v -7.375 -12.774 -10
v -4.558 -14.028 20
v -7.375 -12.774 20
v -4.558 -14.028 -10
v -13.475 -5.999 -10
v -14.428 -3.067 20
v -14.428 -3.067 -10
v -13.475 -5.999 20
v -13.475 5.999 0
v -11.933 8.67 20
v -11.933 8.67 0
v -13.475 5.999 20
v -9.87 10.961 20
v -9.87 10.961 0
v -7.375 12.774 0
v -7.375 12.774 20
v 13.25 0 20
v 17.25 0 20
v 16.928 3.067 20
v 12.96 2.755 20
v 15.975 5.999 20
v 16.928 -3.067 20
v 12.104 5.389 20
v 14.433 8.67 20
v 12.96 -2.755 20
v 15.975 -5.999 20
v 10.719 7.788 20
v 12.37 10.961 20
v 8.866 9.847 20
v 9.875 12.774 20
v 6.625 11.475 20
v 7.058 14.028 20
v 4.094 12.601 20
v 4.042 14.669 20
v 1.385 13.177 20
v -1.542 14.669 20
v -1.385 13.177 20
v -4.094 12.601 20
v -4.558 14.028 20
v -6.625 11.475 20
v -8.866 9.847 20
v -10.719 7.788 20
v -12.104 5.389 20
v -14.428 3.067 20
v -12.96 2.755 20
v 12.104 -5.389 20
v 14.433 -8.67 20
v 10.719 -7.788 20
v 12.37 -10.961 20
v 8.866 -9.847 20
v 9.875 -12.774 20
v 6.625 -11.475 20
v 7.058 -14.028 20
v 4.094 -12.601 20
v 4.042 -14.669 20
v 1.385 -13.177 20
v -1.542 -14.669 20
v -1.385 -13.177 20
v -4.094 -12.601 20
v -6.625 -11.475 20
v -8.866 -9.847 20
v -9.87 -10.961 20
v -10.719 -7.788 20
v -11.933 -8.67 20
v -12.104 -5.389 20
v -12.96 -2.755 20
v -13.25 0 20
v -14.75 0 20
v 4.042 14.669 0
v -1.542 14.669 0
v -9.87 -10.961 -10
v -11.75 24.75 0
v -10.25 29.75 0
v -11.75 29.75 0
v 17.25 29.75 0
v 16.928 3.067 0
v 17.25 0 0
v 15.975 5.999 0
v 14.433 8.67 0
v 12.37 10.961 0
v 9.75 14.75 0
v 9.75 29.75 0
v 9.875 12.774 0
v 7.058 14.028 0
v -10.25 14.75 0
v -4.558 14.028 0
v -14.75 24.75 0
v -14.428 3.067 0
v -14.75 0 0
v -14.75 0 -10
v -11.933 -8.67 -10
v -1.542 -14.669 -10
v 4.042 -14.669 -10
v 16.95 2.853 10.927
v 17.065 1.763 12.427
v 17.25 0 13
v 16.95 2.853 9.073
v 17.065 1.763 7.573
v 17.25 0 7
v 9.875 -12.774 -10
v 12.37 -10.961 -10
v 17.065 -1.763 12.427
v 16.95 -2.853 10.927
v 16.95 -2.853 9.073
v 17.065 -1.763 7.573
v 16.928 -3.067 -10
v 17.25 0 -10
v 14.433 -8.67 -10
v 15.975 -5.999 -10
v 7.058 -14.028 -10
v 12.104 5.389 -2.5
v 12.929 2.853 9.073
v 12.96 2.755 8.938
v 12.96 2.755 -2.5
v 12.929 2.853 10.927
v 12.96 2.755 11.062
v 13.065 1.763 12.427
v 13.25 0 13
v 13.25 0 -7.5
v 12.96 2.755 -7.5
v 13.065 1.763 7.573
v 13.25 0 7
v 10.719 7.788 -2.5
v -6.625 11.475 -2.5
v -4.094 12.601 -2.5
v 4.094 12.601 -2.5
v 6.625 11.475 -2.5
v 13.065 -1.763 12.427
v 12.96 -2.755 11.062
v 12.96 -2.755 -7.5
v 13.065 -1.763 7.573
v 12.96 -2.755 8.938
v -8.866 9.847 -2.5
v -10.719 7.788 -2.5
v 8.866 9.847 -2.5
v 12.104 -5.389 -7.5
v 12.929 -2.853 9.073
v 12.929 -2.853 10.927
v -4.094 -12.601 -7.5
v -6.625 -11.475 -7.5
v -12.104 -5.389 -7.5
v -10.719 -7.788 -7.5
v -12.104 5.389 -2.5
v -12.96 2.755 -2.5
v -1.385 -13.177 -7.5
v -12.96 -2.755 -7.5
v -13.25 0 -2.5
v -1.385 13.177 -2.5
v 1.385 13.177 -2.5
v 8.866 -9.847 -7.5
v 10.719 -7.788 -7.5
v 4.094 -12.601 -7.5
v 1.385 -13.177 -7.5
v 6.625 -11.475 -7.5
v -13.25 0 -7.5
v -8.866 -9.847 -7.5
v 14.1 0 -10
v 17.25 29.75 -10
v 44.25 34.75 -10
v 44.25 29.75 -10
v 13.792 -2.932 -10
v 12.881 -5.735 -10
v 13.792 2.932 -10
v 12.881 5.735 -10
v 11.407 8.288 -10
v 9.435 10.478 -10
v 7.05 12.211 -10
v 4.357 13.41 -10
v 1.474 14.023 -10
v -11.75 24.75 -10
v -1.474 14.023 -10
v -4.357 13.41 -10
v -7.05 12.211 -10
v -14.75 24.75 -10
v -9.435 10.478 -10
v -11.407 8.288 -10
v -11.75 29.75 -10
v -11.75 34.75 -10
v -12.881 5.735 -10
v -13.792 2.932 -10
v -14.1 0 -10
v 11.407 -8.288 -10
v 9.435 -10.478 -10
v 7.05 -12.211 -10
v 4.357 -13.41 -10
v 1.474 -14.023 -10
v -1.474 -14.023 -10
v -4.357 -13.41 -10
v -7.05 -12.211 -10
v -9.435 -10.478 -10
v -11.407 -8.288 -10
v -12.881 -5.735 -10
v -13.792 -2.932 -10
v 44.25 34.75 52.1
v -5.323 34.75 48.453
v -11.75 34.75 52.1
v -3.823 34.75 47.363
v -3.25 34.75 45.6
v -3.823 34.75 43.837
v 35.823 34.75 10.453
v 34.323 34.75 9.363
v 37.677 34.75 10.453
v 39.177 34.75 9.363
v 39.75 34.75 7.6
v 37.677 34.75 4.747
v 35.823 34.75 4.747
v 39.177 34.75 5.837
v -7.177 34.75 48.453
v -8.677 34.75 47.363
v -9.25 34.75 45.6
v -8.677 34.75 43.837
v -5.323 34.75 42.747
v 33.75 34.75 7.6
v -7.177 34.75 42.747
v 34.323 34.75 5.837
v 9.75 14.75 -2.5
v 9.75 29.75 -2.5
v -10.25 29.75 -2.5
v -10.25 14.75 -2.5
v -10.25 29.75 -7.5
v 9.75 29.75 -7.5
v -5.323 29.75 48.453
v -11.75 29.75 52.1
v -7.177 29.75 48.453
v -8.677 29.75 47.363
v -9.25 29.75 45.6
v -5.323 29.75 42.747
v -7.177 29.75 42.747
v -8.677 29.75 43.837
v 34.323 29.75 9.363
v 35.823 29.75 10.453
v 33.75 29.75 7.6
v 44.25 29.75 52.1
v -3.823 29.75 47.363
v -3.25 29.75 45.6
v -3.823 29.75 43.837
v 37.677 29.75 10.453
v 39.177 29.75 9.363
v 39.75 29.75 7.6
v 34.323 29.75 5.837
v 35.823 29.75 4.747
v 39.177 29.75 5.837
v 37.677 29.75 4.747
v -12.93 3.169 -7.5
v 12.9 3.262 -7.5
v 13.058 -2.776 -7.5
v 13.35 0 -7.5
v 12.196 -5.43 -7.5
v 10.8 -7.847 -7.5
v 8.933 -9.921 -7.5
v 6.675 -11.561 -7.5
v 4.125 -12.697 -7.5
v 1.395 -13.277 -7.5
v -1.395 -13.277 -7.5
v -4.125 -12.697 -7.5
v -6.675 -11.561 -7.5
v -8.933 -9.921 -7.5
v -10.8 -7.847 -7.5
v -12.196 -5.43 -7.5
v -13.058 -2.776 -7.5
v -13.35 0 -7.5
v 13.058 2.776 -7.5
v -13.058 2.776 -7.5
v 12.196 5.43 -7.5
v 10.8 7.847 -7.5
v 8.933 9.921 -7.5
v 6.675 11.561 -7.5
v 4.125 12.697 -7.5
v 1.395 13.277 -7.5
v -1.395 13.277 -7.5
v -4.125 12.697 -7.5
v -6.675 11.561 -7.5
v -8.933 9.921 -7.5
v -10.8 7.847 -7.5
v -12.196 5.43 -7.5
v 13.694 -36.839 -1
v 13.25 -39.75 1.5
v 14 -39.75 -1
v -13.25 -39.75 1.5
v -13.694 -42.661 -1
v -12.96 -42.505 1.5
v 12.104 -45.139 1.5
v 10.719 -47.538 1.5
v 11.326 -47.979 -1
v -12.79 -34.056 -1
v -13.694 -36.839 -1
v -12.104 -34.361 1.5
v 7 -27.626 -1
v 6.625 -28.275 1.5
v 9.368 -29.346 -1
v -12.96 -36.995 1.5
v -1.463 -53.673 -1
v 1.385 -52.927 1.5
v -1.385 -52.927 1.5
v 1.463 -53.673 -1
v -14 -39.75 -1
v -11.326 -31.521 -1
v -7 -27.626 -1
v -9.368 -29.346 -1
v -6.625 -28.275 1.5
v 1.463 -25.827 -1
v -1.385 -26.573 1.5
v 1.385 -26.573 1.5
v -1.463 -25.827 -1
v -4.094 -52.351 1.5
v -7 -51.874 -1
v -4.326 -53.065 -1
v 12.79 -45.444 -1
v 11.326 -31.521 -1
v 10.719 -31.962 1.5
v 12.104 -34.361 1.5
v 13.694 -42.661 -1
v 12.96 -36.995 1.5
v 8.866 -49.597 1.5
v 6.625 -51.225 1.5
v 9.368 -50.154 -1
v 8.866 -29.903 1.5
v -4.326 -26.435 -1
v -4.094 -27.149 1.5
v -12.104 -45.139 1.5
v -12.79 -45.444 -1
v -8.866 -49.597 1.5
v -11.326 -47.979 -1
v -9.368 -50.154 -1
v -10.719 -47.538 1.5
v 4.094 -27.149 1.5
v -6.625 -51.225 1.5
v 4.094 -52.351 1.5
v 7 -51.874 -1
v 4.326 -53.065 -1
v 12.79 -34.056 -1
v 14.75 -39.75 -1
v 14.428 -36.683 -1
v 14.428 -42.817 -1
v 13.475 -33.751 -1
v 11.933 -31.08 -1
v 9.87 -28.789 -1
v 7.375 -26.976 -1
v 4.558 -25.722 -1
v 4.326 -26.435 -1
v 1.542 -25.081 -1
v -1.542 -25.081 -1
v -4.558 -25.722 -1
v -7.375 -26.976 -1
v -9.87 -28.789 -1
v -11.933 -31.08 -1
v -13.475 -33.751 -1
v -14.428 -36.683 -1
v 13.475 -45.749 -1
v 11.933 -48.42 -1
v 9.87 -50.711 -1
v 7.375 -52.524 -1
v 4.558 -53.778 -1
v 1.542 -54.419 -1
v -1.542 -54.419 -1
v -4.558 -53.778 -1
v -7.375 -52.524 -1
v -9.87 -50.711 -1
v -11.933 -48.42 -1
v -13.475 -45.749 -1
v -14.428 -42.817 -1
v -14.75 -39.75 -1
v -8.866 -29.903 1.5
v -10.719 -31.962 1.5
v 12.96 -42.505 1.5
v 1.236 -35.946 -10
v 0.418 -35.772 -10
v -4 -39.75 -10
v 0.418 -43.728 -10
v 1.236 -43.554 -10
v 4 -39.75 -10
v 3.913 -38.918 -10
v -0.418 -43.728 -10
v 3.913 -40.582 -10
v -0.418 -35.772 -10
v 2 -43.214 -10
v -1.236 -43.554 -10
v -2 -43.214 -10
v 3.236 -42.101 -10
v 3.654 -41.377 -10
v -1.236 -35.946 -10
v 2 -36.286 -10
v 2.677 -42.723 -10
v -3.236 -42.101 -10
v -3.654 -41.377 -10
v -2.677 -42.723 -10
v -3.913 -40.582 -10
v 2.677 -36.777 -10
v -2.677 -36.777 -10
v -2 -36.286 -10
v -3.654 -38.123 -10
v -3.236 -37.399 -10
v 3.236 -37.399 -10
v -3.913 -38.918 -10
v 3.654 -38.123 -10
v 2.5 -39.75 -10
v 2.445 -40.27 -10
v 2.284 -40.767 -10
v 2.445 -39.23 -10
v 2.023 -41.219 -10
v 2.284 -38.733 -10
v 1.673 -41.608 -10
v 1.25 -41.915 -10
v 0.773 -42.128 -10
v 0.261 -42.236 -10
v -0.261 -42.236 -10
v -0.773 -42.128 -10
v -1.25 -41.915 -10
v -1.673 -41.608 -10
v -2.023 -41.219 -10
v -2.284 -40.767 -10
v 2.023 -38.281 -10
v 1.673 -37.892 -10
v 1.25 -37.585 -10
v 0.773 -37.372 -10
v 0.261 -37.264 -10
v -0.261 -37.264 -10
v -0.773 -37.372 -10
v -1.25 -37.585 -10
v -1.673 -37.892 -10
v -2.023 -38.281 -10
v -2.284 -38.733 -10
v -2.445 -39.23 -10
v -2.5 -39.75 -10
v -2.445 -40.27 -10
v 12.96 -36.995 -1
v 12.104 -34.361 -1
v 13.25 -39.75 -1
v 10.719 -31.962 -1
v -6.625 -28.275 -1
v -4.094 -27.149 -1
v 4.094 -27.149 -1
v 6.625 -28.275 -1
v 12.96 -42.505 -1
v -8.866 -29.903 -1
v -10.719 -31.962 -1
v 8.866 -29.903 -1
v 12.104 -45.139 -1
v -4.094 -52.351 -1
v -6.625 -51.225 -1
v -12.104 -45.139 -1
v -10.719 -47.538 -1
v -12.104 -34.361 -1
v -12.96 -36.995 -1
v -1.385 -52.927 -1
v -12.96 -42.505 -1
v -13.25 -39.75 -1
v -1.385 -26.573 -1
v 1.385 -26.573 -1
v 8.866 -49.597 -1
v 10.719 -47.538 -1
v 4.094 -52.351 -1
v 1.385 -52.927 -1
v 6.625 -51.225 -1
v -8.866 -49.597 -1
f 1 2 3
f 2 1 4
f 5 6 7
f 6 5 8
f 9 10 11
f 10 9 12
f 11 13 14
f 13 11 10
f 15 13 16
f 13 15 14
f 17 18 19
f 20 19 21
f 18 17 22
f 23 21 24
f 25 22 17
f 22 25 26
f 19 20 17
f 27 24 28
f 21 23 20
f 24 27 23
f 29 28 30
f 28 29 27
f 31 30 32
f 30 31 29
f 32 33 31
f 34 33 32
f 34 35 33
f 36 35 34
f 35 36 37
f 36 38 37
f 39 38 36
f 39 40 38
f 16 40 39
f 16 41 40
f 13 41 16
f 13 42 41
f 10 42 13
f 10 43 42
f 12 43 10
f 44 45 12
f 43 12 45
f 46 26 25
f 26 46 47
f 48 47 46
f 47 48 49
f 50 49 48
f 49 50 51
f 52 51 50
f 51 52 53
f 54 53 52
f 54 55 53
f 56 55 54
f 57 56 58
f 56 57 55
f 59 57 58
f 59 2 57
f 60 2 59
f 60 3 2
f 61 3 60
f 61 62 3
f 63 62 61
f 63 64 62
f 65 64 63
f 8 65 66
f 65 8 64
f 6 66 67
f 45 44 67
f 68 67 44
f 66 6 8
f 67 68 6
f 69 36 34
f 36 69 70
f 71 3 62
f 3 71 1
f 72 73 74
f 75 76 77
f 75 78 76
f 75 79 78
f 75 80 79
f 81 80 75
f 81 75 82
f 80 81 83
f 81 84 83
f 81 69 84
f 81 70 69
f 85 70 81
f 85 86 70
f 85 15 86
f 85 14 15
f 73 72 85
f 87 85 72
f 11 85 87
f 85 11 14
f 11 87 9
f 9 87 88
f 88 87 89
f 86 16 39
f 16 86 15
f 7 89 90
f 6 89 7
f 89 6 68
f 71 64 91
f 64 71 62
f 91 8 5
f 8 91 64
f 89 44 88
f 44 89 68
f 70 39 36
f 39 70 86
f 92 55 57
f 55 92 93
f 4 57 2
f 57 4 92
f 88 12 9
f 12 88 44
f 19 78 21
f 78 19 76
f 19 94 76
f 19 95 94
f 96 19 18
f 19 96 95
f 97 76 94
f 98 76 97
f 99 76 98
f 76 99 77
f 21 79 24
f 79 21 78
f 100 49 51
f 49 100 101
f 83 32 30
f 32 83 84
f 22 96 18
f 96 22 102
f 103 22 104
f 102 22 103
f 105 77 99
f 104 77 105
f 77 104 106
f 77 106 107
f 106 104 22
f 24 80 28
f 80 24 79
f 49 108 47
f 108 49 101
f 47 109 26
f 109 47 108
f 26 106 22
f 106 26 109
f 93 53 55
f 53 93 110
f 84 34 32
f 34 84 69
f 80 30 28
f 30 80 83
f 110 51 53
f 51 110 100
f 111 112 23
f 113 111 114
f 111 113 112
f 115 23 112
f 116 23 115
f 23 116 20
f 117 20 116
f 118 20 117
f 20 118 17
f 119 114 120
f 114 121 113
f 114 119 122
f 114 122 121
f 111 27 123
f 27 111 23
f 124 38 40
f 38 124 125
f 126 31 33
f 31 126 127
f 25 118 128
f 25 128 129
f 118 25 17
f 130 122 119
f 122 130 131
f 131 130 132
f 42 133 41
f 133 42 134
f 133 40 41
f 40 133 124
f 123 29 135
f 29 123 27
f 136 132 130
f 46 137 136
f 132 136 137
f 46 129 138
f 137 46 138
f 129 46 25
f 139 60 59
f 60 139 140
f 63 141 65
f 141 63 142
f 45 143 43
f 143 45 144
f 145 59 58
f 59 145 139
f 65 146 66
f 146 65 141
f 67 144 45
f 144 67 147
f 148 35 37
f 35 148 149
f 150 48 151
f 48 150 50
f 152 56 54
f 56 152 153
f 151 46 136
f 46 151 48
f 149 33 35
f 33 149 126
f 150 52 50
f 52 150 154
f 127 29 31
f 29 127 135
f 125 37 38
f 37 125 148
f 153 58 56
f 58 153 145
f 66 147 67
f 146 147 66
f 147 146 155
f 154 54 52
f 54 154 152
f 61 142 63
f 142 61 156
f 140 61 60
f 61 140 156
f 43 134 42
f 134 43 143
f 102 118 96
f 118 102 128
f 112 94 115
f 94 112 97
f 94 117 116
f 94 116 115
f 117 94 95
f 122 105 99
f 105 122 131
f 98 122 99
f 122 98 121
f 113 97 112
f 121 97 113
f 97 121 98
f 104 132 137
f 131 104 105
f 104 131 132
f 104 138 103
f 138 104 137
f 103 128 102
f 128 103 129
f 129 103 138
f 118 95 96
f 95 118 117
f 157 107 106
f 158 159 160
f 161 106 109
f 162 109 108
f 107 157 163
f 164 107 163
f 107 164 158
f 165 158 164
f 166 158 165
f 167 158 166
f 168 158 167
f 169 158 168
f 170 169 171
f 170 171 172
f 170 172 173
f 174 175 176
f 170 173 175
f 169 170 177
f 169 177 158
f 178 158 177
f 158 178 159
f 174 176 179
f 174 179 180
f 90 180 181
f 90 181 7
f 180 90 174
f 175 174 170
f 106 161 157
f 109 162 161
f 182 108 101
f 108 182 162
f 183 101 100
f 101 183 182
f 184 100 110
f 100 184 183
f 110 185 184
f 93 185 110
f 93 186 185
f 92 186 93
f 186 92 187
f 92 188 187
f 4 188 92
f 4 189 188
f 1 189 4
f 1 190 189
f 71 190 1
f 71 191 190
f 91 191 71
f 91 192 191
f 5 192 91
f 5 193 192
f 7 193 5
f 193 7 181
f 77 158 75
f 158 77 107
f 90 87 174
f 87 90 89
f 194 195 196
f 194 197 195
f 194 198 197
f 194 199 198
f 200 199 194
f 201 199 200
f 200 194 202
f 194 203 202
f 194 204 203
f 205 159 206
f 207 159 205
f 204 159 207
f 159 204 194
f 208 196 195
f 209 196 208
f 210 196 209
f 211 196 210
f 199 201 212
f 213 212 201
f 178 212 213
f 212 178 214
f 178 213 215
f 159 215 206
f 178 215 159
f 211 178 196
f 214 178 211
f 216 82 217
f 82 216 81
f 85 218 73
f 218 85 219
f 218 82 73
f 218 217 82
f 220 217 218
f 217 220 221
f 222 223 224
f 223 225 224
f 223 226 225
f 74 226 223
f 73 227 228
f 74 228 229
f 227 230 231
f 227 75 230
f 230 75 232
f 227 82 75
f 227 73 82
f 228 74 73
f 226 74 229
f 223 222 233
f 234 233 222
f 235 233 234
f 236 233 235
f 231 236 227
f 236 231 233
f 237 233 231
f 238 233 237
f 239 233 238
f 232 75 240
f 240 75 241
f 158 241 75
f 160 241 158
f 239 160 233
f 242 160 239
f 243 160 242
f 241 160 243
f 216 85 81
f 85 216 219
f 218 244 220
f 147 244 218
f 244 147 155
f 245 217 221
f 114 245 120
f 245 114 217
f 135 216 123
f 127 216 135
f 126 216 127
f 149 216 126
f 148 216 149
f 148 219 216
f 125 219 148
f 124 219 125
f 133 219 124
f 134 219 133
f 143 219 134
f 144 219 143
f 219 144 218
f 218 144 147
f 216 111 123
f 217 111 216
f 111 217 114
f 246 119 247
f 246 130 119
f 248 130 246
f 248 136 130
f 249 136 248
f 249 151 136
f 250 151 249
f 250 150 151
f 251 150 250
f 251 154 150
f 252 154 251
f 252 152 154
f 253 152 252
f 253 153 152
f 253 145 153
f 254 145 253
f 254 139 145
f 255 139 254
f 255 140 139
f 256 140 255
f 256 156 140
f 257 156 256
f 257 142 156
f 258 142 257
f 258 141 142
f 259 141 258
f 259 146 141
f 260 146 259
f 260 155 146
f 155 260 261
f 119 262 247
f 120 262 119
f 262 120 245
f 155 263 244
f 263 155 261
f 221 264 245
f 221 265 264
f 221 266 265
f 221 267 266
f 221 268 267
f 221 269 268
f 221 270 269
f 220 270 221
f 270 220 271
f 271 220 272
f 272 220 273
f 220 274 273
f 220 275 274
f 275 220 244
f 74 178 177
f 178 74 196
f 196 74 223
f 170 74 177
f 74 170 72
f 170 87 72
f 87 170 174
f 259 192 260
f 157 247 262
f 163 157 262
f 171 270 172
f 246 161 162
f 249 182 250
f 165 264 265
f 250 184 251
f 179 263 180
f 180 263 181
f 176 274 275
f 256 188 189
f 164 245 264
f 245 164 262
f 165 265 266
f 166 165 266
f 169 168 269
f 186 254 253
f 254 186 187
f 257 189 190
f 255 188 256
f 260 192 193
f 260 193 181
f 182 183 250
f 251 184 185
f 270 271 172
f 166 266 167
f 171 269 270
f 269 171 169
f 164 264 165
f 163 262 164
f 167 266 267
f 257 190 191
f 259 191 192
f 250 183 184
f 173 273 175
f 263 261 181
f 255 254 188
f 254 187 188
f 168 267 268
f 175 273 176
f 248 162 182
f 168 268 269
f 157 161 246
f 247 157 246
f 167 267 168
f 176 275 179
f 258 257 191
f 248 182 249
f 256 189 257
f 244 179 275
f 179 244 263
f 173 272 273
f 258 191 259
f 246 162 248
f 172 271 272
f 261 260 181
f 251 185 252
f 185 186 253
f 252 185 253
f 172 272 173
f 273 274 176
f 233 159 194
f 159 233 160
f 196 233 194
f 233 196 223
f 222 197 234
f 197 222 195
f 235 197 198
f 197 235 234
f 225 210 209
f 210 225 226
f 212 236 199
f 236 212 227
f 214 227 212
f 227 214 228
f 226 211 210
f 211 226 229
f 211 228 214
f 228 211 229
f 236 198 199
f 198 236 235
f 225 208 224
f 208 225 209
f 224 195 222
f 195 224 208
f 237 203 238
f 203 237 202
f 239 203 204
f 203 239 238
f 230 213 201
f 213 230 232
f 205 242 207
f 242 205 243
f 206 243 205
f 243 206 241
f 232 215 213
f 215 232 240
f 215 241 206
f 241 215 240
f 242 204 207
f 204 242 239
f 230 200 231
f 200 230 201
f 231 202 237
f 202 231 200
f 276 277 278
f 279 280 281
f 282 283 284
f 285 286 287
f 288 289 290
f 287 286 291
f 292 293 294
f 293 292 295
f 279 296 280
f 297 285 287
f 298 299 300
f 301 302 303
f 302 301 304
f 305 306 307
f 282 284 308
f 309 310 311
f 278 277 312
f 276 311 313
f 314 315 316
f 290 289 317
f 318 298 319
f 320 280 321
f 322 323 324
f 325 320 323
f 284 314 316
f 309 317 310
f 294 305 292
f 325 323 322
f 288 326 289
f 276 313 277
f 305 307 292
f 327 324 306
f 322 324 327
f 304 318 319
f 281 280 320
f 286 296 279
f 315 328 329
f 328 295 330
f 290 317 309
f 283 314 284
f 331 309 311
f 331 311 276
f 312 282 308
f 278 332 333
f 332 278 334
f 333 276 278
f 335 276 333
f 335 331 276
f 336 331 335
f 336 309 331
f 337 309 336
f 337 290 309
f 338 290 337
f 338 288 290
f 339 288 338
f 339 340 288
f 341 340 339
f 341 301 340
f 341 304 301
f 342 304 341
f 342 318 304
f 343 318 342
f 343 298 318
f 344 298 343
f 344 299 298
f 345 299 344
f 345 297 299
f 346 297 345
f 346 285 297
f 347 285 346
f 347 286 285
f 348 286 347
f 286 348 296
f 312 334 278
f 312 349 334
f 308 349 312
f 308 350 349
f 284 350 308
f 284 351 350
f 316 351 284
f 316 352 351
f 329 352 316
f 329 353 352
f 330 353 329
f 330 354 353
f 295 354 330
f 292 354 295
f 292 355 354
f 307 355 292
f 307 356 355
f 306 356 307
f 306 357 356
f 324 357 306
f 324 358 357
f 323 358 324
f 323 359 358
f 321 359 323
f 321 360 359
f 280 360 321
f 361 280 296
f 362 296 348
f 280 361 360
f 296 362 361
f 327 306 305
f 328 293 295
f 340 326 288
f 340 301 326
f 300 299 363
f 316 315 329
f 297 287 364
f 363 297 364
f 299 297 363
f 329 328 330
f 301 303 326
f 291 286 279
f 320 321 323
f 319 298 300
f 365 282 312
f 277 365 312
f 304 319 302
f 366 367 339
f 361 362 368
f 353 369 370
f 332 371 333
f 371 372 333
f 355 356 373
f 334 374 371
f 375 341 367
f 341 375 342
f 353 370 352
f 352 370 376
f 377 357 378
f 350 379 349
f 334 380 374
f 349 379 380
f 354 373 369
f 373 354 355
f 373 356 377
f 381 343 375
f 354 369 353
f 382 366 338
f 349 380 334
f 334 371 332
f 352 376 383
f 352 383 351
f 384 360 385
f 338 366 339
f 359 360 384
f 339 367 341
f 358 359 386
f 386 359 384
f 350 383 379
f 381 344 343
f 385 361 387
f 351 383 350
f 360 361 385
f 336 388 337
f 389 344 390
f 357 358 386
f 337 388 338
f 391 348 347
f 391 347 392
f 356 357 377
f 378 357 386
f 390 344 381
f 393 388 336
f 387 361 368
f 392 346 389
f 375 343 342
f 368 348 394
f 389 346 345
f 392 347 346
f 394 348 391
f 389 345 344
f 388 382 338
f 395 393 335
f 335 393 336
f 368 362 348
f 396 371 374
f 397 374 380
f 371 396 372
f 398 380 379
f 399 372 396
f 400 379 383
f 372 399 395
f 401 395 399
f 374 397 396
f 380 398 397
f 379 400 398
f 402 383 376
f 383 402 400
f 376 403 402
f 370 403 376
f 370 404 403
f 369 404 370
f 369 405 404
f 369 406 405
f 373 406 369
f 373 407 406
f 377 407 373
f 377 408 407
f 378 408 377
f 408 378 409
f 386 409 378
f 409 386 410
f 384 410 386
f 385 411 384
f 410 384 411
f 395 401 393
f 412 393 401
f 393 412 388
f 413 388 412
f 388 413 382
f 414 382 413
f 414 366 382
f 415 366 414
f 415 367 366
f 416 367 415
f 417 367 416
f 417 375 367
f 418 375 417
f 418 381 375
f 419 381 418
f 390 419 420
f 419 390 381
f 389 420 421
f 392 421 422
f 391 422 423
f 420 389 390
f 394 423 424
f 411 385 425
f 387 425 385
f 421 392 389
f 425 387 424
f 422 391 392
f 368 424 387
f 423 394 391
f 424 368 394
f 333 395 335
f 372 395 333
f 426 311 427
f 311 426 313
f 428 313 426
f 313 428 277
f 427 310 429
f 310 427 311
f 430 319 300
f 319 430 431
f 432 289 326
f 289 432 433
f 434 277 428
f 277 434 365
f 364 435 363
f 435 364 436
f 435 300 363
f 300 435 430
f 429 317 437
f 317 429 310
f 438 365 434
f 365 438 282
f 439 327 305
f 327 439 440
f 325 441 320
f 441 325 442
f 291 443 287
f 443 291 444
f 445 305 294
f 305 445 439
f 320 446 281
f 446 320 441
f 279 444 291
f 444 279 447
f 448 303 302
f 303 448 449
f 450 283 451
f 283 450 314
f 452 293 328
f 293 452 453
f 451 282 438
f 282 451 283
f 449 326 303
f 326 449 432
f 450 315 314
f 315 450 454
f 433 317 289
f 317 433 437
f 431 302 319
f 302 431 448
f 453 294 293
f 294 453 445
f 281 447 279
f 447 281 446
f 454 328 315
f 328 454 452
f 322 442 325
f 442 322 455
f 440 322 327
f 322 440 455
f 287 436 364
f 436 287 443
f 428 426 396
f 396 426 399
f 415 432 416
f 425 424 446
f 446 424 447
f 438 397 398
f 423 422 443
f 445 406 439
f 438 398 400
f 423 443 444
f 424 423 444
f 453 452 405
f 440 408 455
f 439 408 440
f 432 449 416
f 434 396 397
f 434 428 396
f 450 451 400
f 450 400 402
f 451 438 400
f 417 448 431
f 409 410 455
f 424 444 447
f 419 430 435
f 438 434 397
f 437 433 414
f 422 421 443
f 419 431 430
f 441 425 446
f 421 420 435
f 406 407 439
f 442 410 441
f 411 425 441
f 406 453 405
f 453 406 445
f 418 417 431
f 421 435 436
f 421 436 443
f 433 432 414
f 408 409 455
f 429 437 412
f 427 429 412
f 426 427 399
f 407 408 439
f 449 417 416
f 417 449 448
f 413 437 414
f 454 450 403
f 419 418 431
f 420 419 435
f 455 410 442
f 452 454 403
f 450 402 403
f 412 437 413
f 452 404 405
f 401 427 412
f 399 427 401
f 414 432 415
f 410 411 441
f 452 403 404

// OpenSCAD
// Height of the blow Cone
coneheight=9;
// Hole in the Cone
coneholediameter = 5;
// Diameter of the Lasertube
diameterlaser=26.5;
// Height of the Lasertube
heightlaser=20;
// Wall thickness
wallthickness=1.5;
// Make the front thicker to accept the threaded insert
frontshift=2.5;

// Mounting hole distance from bottom of plate
heightmountinghole=10;
// Mounting hole diameter
diametermountinghole=6.0;

// Baseplate thickness
thicknessbaseplate=10;

// Fan opening - width
fanwidth=15;
// Fan opening - height
fanheight=20;
// Position of the fan mounting screwholes - X Position of first hole
fanmountx1=4;
// Position of the fan mounting screwholes - Y Position of first hole
fanmounty1=6.6+38;
// Position of the fan mounting screwholes - X Position of second hole
fanmountx2=4+43;
// Position of the fan mounting screwholes - Y Position of second hole
fanmounty2=6.6;
// Diameter of the fan mounting screwholes
fanmountdia=6;
// How much to shift the entire fan mount forward
shiftfan = 3;
// Thickness of the supporting wall
thicknesssupportwall=5;


union() {

  // Tube
  difference() {
    union() {
      cylinder(d=diameterlaser+2*wallthickness,h=heightlaser);
      translate([frontshift,0,0]) cylinder(d=diameterlaser+2*wallthickness,h=heightlaser);
    }
    cylinder(d=diameterlaser,h=heightlaser);
    translate([diameterlaser/4,0,heightmountinghole])
      rotate([0,90,0])
        cylinder(d=diametermountinghole,h=diameterlaser);
  }

  // Baseplate
   difference () {
    translate([-diameterlaser/2-wallthickness,-diameterlaser/2-wallthickness,-thicknessbaseplate])
      cube([diameterlaser+2*wallthickness+frontshift, diameterlaser+2*wallthickness + fanwidth + thicknesssupportwall, thicknessbaseplate]);
    translate([0,0,-thicknessbaseplate]) cylinder(d=diameterlaser,h=thicknessbaseplate);
    translate([shiftfan,0,0])
      translate([-diameterlaser/2,diameterlaser/2+wallthickness,-thicknessbaseplate/2]) cube([fanheight,fanwidth,thicknessbaseplate/2]);

    // Channel for airflow
      hull() {
        translate([shiftfan,0,0])
          translate([-diameterlaser/2,diameterlaser/2+wallthickness,-thicknessbaseplate*3/4]) cube([fanheight,fanwidth,thicknessbaseplate/2]);
        translate([0,0,-thicknessbaseplate*3/4]) cylinder(d=diameterlaser,h=thicknessbaseplate/2);
      }

    // Cutting away material to make room for the screws
    translate([-diameterlaser/2-wallthickness,diameterlaser/2+wallthickness+0.5*(fanwidth+thicknesssupportwall),-thicknessbaseplate])
      cube([shiftfan,0.5*(fanwidth+thicknesssupportwall),thicknessbaseplate]);

    // Chamfer to register the cone
    translate([0,0,-thicknessbaseplate])
      cylinder(d1=diameterlaser+wallthickness+0.2,d2=diameterlaser+0.2,h=thicknessbaseplate*0.25);

    // Rounding of the corners next to the tube (only for the look)
    difference () {
      translate([-diameterlaser/2-wallthickness,-diameterlaser/2-wallthickness,-thicknessbaseplate])
        cube([diameterlaser+2*wallthickness+frontshift, diameterlaser/2+wallthickness, thicknessbaseplate]);

      translate([0,0,-thicknessbaseplate]) union() {
        cylinder(d=diameterlaser+2*wallthickness,h=heightlaser);
        translate([frontshift,0,0]) cylinder(d=diameterlaser+2*wallthickness,h=heightlaser);
      }

    }

  }

  // Support wall
  wallheight = thicknessbaseplate + max(fanmounty1,fanmounty2) + wallthickness + fanmountdia;
  wallwidth = max(fanmountx1,fanmountx2) + 2 * wallthickness +fanmountdia;
  translate([shiftfan,0,0])
    translate([-diameterlaser/2-wallthickness,diameterlaser/2+wallthickness+fanwidth,-thicknessbaseplate])
      difference() {
        cube([wallwidth,thicknesssupportwall,wallheight]);
        translate([wallthickness+fanmountx1,thicknesssupportwall,thicknesssupportwall+fanmounty1+fanmountdia]) rotate([90,0,0]) cylinder(d=fanmountdia,h=thicknesssupportwall);
        translate([wallthickness+fanmountx2,thicknesssupportwall,thicknesssupportwall+fanmounty2+fanmountdia]) rotate([90,0,0]) cylinder(d=fanmountdia,h=thicknesssupportwall);
      }

}

// Cone
translate([0,-diameterlaser*1.5,coneheight-thicknessbaseplate])
difference() {
  union() {
    cylinder(d1=diameterlaser+wallthickness,d2=diameterlaser,h=thicknessbaseplate*0.25);
    translate([0,0,-coneheight]) cylinder(d1=coneholediameter+2*wallthickness,d2=diameterlaser+2*wallthickness,h=coneheight);
  }
  cylinder(d=diameterlaser,h=thicknessbaseplate*0.25);
  translate([0,0,-coneheight]) cylinder(d1=coneholediameter,d2=diameterlaser,h=coneheight);
}
